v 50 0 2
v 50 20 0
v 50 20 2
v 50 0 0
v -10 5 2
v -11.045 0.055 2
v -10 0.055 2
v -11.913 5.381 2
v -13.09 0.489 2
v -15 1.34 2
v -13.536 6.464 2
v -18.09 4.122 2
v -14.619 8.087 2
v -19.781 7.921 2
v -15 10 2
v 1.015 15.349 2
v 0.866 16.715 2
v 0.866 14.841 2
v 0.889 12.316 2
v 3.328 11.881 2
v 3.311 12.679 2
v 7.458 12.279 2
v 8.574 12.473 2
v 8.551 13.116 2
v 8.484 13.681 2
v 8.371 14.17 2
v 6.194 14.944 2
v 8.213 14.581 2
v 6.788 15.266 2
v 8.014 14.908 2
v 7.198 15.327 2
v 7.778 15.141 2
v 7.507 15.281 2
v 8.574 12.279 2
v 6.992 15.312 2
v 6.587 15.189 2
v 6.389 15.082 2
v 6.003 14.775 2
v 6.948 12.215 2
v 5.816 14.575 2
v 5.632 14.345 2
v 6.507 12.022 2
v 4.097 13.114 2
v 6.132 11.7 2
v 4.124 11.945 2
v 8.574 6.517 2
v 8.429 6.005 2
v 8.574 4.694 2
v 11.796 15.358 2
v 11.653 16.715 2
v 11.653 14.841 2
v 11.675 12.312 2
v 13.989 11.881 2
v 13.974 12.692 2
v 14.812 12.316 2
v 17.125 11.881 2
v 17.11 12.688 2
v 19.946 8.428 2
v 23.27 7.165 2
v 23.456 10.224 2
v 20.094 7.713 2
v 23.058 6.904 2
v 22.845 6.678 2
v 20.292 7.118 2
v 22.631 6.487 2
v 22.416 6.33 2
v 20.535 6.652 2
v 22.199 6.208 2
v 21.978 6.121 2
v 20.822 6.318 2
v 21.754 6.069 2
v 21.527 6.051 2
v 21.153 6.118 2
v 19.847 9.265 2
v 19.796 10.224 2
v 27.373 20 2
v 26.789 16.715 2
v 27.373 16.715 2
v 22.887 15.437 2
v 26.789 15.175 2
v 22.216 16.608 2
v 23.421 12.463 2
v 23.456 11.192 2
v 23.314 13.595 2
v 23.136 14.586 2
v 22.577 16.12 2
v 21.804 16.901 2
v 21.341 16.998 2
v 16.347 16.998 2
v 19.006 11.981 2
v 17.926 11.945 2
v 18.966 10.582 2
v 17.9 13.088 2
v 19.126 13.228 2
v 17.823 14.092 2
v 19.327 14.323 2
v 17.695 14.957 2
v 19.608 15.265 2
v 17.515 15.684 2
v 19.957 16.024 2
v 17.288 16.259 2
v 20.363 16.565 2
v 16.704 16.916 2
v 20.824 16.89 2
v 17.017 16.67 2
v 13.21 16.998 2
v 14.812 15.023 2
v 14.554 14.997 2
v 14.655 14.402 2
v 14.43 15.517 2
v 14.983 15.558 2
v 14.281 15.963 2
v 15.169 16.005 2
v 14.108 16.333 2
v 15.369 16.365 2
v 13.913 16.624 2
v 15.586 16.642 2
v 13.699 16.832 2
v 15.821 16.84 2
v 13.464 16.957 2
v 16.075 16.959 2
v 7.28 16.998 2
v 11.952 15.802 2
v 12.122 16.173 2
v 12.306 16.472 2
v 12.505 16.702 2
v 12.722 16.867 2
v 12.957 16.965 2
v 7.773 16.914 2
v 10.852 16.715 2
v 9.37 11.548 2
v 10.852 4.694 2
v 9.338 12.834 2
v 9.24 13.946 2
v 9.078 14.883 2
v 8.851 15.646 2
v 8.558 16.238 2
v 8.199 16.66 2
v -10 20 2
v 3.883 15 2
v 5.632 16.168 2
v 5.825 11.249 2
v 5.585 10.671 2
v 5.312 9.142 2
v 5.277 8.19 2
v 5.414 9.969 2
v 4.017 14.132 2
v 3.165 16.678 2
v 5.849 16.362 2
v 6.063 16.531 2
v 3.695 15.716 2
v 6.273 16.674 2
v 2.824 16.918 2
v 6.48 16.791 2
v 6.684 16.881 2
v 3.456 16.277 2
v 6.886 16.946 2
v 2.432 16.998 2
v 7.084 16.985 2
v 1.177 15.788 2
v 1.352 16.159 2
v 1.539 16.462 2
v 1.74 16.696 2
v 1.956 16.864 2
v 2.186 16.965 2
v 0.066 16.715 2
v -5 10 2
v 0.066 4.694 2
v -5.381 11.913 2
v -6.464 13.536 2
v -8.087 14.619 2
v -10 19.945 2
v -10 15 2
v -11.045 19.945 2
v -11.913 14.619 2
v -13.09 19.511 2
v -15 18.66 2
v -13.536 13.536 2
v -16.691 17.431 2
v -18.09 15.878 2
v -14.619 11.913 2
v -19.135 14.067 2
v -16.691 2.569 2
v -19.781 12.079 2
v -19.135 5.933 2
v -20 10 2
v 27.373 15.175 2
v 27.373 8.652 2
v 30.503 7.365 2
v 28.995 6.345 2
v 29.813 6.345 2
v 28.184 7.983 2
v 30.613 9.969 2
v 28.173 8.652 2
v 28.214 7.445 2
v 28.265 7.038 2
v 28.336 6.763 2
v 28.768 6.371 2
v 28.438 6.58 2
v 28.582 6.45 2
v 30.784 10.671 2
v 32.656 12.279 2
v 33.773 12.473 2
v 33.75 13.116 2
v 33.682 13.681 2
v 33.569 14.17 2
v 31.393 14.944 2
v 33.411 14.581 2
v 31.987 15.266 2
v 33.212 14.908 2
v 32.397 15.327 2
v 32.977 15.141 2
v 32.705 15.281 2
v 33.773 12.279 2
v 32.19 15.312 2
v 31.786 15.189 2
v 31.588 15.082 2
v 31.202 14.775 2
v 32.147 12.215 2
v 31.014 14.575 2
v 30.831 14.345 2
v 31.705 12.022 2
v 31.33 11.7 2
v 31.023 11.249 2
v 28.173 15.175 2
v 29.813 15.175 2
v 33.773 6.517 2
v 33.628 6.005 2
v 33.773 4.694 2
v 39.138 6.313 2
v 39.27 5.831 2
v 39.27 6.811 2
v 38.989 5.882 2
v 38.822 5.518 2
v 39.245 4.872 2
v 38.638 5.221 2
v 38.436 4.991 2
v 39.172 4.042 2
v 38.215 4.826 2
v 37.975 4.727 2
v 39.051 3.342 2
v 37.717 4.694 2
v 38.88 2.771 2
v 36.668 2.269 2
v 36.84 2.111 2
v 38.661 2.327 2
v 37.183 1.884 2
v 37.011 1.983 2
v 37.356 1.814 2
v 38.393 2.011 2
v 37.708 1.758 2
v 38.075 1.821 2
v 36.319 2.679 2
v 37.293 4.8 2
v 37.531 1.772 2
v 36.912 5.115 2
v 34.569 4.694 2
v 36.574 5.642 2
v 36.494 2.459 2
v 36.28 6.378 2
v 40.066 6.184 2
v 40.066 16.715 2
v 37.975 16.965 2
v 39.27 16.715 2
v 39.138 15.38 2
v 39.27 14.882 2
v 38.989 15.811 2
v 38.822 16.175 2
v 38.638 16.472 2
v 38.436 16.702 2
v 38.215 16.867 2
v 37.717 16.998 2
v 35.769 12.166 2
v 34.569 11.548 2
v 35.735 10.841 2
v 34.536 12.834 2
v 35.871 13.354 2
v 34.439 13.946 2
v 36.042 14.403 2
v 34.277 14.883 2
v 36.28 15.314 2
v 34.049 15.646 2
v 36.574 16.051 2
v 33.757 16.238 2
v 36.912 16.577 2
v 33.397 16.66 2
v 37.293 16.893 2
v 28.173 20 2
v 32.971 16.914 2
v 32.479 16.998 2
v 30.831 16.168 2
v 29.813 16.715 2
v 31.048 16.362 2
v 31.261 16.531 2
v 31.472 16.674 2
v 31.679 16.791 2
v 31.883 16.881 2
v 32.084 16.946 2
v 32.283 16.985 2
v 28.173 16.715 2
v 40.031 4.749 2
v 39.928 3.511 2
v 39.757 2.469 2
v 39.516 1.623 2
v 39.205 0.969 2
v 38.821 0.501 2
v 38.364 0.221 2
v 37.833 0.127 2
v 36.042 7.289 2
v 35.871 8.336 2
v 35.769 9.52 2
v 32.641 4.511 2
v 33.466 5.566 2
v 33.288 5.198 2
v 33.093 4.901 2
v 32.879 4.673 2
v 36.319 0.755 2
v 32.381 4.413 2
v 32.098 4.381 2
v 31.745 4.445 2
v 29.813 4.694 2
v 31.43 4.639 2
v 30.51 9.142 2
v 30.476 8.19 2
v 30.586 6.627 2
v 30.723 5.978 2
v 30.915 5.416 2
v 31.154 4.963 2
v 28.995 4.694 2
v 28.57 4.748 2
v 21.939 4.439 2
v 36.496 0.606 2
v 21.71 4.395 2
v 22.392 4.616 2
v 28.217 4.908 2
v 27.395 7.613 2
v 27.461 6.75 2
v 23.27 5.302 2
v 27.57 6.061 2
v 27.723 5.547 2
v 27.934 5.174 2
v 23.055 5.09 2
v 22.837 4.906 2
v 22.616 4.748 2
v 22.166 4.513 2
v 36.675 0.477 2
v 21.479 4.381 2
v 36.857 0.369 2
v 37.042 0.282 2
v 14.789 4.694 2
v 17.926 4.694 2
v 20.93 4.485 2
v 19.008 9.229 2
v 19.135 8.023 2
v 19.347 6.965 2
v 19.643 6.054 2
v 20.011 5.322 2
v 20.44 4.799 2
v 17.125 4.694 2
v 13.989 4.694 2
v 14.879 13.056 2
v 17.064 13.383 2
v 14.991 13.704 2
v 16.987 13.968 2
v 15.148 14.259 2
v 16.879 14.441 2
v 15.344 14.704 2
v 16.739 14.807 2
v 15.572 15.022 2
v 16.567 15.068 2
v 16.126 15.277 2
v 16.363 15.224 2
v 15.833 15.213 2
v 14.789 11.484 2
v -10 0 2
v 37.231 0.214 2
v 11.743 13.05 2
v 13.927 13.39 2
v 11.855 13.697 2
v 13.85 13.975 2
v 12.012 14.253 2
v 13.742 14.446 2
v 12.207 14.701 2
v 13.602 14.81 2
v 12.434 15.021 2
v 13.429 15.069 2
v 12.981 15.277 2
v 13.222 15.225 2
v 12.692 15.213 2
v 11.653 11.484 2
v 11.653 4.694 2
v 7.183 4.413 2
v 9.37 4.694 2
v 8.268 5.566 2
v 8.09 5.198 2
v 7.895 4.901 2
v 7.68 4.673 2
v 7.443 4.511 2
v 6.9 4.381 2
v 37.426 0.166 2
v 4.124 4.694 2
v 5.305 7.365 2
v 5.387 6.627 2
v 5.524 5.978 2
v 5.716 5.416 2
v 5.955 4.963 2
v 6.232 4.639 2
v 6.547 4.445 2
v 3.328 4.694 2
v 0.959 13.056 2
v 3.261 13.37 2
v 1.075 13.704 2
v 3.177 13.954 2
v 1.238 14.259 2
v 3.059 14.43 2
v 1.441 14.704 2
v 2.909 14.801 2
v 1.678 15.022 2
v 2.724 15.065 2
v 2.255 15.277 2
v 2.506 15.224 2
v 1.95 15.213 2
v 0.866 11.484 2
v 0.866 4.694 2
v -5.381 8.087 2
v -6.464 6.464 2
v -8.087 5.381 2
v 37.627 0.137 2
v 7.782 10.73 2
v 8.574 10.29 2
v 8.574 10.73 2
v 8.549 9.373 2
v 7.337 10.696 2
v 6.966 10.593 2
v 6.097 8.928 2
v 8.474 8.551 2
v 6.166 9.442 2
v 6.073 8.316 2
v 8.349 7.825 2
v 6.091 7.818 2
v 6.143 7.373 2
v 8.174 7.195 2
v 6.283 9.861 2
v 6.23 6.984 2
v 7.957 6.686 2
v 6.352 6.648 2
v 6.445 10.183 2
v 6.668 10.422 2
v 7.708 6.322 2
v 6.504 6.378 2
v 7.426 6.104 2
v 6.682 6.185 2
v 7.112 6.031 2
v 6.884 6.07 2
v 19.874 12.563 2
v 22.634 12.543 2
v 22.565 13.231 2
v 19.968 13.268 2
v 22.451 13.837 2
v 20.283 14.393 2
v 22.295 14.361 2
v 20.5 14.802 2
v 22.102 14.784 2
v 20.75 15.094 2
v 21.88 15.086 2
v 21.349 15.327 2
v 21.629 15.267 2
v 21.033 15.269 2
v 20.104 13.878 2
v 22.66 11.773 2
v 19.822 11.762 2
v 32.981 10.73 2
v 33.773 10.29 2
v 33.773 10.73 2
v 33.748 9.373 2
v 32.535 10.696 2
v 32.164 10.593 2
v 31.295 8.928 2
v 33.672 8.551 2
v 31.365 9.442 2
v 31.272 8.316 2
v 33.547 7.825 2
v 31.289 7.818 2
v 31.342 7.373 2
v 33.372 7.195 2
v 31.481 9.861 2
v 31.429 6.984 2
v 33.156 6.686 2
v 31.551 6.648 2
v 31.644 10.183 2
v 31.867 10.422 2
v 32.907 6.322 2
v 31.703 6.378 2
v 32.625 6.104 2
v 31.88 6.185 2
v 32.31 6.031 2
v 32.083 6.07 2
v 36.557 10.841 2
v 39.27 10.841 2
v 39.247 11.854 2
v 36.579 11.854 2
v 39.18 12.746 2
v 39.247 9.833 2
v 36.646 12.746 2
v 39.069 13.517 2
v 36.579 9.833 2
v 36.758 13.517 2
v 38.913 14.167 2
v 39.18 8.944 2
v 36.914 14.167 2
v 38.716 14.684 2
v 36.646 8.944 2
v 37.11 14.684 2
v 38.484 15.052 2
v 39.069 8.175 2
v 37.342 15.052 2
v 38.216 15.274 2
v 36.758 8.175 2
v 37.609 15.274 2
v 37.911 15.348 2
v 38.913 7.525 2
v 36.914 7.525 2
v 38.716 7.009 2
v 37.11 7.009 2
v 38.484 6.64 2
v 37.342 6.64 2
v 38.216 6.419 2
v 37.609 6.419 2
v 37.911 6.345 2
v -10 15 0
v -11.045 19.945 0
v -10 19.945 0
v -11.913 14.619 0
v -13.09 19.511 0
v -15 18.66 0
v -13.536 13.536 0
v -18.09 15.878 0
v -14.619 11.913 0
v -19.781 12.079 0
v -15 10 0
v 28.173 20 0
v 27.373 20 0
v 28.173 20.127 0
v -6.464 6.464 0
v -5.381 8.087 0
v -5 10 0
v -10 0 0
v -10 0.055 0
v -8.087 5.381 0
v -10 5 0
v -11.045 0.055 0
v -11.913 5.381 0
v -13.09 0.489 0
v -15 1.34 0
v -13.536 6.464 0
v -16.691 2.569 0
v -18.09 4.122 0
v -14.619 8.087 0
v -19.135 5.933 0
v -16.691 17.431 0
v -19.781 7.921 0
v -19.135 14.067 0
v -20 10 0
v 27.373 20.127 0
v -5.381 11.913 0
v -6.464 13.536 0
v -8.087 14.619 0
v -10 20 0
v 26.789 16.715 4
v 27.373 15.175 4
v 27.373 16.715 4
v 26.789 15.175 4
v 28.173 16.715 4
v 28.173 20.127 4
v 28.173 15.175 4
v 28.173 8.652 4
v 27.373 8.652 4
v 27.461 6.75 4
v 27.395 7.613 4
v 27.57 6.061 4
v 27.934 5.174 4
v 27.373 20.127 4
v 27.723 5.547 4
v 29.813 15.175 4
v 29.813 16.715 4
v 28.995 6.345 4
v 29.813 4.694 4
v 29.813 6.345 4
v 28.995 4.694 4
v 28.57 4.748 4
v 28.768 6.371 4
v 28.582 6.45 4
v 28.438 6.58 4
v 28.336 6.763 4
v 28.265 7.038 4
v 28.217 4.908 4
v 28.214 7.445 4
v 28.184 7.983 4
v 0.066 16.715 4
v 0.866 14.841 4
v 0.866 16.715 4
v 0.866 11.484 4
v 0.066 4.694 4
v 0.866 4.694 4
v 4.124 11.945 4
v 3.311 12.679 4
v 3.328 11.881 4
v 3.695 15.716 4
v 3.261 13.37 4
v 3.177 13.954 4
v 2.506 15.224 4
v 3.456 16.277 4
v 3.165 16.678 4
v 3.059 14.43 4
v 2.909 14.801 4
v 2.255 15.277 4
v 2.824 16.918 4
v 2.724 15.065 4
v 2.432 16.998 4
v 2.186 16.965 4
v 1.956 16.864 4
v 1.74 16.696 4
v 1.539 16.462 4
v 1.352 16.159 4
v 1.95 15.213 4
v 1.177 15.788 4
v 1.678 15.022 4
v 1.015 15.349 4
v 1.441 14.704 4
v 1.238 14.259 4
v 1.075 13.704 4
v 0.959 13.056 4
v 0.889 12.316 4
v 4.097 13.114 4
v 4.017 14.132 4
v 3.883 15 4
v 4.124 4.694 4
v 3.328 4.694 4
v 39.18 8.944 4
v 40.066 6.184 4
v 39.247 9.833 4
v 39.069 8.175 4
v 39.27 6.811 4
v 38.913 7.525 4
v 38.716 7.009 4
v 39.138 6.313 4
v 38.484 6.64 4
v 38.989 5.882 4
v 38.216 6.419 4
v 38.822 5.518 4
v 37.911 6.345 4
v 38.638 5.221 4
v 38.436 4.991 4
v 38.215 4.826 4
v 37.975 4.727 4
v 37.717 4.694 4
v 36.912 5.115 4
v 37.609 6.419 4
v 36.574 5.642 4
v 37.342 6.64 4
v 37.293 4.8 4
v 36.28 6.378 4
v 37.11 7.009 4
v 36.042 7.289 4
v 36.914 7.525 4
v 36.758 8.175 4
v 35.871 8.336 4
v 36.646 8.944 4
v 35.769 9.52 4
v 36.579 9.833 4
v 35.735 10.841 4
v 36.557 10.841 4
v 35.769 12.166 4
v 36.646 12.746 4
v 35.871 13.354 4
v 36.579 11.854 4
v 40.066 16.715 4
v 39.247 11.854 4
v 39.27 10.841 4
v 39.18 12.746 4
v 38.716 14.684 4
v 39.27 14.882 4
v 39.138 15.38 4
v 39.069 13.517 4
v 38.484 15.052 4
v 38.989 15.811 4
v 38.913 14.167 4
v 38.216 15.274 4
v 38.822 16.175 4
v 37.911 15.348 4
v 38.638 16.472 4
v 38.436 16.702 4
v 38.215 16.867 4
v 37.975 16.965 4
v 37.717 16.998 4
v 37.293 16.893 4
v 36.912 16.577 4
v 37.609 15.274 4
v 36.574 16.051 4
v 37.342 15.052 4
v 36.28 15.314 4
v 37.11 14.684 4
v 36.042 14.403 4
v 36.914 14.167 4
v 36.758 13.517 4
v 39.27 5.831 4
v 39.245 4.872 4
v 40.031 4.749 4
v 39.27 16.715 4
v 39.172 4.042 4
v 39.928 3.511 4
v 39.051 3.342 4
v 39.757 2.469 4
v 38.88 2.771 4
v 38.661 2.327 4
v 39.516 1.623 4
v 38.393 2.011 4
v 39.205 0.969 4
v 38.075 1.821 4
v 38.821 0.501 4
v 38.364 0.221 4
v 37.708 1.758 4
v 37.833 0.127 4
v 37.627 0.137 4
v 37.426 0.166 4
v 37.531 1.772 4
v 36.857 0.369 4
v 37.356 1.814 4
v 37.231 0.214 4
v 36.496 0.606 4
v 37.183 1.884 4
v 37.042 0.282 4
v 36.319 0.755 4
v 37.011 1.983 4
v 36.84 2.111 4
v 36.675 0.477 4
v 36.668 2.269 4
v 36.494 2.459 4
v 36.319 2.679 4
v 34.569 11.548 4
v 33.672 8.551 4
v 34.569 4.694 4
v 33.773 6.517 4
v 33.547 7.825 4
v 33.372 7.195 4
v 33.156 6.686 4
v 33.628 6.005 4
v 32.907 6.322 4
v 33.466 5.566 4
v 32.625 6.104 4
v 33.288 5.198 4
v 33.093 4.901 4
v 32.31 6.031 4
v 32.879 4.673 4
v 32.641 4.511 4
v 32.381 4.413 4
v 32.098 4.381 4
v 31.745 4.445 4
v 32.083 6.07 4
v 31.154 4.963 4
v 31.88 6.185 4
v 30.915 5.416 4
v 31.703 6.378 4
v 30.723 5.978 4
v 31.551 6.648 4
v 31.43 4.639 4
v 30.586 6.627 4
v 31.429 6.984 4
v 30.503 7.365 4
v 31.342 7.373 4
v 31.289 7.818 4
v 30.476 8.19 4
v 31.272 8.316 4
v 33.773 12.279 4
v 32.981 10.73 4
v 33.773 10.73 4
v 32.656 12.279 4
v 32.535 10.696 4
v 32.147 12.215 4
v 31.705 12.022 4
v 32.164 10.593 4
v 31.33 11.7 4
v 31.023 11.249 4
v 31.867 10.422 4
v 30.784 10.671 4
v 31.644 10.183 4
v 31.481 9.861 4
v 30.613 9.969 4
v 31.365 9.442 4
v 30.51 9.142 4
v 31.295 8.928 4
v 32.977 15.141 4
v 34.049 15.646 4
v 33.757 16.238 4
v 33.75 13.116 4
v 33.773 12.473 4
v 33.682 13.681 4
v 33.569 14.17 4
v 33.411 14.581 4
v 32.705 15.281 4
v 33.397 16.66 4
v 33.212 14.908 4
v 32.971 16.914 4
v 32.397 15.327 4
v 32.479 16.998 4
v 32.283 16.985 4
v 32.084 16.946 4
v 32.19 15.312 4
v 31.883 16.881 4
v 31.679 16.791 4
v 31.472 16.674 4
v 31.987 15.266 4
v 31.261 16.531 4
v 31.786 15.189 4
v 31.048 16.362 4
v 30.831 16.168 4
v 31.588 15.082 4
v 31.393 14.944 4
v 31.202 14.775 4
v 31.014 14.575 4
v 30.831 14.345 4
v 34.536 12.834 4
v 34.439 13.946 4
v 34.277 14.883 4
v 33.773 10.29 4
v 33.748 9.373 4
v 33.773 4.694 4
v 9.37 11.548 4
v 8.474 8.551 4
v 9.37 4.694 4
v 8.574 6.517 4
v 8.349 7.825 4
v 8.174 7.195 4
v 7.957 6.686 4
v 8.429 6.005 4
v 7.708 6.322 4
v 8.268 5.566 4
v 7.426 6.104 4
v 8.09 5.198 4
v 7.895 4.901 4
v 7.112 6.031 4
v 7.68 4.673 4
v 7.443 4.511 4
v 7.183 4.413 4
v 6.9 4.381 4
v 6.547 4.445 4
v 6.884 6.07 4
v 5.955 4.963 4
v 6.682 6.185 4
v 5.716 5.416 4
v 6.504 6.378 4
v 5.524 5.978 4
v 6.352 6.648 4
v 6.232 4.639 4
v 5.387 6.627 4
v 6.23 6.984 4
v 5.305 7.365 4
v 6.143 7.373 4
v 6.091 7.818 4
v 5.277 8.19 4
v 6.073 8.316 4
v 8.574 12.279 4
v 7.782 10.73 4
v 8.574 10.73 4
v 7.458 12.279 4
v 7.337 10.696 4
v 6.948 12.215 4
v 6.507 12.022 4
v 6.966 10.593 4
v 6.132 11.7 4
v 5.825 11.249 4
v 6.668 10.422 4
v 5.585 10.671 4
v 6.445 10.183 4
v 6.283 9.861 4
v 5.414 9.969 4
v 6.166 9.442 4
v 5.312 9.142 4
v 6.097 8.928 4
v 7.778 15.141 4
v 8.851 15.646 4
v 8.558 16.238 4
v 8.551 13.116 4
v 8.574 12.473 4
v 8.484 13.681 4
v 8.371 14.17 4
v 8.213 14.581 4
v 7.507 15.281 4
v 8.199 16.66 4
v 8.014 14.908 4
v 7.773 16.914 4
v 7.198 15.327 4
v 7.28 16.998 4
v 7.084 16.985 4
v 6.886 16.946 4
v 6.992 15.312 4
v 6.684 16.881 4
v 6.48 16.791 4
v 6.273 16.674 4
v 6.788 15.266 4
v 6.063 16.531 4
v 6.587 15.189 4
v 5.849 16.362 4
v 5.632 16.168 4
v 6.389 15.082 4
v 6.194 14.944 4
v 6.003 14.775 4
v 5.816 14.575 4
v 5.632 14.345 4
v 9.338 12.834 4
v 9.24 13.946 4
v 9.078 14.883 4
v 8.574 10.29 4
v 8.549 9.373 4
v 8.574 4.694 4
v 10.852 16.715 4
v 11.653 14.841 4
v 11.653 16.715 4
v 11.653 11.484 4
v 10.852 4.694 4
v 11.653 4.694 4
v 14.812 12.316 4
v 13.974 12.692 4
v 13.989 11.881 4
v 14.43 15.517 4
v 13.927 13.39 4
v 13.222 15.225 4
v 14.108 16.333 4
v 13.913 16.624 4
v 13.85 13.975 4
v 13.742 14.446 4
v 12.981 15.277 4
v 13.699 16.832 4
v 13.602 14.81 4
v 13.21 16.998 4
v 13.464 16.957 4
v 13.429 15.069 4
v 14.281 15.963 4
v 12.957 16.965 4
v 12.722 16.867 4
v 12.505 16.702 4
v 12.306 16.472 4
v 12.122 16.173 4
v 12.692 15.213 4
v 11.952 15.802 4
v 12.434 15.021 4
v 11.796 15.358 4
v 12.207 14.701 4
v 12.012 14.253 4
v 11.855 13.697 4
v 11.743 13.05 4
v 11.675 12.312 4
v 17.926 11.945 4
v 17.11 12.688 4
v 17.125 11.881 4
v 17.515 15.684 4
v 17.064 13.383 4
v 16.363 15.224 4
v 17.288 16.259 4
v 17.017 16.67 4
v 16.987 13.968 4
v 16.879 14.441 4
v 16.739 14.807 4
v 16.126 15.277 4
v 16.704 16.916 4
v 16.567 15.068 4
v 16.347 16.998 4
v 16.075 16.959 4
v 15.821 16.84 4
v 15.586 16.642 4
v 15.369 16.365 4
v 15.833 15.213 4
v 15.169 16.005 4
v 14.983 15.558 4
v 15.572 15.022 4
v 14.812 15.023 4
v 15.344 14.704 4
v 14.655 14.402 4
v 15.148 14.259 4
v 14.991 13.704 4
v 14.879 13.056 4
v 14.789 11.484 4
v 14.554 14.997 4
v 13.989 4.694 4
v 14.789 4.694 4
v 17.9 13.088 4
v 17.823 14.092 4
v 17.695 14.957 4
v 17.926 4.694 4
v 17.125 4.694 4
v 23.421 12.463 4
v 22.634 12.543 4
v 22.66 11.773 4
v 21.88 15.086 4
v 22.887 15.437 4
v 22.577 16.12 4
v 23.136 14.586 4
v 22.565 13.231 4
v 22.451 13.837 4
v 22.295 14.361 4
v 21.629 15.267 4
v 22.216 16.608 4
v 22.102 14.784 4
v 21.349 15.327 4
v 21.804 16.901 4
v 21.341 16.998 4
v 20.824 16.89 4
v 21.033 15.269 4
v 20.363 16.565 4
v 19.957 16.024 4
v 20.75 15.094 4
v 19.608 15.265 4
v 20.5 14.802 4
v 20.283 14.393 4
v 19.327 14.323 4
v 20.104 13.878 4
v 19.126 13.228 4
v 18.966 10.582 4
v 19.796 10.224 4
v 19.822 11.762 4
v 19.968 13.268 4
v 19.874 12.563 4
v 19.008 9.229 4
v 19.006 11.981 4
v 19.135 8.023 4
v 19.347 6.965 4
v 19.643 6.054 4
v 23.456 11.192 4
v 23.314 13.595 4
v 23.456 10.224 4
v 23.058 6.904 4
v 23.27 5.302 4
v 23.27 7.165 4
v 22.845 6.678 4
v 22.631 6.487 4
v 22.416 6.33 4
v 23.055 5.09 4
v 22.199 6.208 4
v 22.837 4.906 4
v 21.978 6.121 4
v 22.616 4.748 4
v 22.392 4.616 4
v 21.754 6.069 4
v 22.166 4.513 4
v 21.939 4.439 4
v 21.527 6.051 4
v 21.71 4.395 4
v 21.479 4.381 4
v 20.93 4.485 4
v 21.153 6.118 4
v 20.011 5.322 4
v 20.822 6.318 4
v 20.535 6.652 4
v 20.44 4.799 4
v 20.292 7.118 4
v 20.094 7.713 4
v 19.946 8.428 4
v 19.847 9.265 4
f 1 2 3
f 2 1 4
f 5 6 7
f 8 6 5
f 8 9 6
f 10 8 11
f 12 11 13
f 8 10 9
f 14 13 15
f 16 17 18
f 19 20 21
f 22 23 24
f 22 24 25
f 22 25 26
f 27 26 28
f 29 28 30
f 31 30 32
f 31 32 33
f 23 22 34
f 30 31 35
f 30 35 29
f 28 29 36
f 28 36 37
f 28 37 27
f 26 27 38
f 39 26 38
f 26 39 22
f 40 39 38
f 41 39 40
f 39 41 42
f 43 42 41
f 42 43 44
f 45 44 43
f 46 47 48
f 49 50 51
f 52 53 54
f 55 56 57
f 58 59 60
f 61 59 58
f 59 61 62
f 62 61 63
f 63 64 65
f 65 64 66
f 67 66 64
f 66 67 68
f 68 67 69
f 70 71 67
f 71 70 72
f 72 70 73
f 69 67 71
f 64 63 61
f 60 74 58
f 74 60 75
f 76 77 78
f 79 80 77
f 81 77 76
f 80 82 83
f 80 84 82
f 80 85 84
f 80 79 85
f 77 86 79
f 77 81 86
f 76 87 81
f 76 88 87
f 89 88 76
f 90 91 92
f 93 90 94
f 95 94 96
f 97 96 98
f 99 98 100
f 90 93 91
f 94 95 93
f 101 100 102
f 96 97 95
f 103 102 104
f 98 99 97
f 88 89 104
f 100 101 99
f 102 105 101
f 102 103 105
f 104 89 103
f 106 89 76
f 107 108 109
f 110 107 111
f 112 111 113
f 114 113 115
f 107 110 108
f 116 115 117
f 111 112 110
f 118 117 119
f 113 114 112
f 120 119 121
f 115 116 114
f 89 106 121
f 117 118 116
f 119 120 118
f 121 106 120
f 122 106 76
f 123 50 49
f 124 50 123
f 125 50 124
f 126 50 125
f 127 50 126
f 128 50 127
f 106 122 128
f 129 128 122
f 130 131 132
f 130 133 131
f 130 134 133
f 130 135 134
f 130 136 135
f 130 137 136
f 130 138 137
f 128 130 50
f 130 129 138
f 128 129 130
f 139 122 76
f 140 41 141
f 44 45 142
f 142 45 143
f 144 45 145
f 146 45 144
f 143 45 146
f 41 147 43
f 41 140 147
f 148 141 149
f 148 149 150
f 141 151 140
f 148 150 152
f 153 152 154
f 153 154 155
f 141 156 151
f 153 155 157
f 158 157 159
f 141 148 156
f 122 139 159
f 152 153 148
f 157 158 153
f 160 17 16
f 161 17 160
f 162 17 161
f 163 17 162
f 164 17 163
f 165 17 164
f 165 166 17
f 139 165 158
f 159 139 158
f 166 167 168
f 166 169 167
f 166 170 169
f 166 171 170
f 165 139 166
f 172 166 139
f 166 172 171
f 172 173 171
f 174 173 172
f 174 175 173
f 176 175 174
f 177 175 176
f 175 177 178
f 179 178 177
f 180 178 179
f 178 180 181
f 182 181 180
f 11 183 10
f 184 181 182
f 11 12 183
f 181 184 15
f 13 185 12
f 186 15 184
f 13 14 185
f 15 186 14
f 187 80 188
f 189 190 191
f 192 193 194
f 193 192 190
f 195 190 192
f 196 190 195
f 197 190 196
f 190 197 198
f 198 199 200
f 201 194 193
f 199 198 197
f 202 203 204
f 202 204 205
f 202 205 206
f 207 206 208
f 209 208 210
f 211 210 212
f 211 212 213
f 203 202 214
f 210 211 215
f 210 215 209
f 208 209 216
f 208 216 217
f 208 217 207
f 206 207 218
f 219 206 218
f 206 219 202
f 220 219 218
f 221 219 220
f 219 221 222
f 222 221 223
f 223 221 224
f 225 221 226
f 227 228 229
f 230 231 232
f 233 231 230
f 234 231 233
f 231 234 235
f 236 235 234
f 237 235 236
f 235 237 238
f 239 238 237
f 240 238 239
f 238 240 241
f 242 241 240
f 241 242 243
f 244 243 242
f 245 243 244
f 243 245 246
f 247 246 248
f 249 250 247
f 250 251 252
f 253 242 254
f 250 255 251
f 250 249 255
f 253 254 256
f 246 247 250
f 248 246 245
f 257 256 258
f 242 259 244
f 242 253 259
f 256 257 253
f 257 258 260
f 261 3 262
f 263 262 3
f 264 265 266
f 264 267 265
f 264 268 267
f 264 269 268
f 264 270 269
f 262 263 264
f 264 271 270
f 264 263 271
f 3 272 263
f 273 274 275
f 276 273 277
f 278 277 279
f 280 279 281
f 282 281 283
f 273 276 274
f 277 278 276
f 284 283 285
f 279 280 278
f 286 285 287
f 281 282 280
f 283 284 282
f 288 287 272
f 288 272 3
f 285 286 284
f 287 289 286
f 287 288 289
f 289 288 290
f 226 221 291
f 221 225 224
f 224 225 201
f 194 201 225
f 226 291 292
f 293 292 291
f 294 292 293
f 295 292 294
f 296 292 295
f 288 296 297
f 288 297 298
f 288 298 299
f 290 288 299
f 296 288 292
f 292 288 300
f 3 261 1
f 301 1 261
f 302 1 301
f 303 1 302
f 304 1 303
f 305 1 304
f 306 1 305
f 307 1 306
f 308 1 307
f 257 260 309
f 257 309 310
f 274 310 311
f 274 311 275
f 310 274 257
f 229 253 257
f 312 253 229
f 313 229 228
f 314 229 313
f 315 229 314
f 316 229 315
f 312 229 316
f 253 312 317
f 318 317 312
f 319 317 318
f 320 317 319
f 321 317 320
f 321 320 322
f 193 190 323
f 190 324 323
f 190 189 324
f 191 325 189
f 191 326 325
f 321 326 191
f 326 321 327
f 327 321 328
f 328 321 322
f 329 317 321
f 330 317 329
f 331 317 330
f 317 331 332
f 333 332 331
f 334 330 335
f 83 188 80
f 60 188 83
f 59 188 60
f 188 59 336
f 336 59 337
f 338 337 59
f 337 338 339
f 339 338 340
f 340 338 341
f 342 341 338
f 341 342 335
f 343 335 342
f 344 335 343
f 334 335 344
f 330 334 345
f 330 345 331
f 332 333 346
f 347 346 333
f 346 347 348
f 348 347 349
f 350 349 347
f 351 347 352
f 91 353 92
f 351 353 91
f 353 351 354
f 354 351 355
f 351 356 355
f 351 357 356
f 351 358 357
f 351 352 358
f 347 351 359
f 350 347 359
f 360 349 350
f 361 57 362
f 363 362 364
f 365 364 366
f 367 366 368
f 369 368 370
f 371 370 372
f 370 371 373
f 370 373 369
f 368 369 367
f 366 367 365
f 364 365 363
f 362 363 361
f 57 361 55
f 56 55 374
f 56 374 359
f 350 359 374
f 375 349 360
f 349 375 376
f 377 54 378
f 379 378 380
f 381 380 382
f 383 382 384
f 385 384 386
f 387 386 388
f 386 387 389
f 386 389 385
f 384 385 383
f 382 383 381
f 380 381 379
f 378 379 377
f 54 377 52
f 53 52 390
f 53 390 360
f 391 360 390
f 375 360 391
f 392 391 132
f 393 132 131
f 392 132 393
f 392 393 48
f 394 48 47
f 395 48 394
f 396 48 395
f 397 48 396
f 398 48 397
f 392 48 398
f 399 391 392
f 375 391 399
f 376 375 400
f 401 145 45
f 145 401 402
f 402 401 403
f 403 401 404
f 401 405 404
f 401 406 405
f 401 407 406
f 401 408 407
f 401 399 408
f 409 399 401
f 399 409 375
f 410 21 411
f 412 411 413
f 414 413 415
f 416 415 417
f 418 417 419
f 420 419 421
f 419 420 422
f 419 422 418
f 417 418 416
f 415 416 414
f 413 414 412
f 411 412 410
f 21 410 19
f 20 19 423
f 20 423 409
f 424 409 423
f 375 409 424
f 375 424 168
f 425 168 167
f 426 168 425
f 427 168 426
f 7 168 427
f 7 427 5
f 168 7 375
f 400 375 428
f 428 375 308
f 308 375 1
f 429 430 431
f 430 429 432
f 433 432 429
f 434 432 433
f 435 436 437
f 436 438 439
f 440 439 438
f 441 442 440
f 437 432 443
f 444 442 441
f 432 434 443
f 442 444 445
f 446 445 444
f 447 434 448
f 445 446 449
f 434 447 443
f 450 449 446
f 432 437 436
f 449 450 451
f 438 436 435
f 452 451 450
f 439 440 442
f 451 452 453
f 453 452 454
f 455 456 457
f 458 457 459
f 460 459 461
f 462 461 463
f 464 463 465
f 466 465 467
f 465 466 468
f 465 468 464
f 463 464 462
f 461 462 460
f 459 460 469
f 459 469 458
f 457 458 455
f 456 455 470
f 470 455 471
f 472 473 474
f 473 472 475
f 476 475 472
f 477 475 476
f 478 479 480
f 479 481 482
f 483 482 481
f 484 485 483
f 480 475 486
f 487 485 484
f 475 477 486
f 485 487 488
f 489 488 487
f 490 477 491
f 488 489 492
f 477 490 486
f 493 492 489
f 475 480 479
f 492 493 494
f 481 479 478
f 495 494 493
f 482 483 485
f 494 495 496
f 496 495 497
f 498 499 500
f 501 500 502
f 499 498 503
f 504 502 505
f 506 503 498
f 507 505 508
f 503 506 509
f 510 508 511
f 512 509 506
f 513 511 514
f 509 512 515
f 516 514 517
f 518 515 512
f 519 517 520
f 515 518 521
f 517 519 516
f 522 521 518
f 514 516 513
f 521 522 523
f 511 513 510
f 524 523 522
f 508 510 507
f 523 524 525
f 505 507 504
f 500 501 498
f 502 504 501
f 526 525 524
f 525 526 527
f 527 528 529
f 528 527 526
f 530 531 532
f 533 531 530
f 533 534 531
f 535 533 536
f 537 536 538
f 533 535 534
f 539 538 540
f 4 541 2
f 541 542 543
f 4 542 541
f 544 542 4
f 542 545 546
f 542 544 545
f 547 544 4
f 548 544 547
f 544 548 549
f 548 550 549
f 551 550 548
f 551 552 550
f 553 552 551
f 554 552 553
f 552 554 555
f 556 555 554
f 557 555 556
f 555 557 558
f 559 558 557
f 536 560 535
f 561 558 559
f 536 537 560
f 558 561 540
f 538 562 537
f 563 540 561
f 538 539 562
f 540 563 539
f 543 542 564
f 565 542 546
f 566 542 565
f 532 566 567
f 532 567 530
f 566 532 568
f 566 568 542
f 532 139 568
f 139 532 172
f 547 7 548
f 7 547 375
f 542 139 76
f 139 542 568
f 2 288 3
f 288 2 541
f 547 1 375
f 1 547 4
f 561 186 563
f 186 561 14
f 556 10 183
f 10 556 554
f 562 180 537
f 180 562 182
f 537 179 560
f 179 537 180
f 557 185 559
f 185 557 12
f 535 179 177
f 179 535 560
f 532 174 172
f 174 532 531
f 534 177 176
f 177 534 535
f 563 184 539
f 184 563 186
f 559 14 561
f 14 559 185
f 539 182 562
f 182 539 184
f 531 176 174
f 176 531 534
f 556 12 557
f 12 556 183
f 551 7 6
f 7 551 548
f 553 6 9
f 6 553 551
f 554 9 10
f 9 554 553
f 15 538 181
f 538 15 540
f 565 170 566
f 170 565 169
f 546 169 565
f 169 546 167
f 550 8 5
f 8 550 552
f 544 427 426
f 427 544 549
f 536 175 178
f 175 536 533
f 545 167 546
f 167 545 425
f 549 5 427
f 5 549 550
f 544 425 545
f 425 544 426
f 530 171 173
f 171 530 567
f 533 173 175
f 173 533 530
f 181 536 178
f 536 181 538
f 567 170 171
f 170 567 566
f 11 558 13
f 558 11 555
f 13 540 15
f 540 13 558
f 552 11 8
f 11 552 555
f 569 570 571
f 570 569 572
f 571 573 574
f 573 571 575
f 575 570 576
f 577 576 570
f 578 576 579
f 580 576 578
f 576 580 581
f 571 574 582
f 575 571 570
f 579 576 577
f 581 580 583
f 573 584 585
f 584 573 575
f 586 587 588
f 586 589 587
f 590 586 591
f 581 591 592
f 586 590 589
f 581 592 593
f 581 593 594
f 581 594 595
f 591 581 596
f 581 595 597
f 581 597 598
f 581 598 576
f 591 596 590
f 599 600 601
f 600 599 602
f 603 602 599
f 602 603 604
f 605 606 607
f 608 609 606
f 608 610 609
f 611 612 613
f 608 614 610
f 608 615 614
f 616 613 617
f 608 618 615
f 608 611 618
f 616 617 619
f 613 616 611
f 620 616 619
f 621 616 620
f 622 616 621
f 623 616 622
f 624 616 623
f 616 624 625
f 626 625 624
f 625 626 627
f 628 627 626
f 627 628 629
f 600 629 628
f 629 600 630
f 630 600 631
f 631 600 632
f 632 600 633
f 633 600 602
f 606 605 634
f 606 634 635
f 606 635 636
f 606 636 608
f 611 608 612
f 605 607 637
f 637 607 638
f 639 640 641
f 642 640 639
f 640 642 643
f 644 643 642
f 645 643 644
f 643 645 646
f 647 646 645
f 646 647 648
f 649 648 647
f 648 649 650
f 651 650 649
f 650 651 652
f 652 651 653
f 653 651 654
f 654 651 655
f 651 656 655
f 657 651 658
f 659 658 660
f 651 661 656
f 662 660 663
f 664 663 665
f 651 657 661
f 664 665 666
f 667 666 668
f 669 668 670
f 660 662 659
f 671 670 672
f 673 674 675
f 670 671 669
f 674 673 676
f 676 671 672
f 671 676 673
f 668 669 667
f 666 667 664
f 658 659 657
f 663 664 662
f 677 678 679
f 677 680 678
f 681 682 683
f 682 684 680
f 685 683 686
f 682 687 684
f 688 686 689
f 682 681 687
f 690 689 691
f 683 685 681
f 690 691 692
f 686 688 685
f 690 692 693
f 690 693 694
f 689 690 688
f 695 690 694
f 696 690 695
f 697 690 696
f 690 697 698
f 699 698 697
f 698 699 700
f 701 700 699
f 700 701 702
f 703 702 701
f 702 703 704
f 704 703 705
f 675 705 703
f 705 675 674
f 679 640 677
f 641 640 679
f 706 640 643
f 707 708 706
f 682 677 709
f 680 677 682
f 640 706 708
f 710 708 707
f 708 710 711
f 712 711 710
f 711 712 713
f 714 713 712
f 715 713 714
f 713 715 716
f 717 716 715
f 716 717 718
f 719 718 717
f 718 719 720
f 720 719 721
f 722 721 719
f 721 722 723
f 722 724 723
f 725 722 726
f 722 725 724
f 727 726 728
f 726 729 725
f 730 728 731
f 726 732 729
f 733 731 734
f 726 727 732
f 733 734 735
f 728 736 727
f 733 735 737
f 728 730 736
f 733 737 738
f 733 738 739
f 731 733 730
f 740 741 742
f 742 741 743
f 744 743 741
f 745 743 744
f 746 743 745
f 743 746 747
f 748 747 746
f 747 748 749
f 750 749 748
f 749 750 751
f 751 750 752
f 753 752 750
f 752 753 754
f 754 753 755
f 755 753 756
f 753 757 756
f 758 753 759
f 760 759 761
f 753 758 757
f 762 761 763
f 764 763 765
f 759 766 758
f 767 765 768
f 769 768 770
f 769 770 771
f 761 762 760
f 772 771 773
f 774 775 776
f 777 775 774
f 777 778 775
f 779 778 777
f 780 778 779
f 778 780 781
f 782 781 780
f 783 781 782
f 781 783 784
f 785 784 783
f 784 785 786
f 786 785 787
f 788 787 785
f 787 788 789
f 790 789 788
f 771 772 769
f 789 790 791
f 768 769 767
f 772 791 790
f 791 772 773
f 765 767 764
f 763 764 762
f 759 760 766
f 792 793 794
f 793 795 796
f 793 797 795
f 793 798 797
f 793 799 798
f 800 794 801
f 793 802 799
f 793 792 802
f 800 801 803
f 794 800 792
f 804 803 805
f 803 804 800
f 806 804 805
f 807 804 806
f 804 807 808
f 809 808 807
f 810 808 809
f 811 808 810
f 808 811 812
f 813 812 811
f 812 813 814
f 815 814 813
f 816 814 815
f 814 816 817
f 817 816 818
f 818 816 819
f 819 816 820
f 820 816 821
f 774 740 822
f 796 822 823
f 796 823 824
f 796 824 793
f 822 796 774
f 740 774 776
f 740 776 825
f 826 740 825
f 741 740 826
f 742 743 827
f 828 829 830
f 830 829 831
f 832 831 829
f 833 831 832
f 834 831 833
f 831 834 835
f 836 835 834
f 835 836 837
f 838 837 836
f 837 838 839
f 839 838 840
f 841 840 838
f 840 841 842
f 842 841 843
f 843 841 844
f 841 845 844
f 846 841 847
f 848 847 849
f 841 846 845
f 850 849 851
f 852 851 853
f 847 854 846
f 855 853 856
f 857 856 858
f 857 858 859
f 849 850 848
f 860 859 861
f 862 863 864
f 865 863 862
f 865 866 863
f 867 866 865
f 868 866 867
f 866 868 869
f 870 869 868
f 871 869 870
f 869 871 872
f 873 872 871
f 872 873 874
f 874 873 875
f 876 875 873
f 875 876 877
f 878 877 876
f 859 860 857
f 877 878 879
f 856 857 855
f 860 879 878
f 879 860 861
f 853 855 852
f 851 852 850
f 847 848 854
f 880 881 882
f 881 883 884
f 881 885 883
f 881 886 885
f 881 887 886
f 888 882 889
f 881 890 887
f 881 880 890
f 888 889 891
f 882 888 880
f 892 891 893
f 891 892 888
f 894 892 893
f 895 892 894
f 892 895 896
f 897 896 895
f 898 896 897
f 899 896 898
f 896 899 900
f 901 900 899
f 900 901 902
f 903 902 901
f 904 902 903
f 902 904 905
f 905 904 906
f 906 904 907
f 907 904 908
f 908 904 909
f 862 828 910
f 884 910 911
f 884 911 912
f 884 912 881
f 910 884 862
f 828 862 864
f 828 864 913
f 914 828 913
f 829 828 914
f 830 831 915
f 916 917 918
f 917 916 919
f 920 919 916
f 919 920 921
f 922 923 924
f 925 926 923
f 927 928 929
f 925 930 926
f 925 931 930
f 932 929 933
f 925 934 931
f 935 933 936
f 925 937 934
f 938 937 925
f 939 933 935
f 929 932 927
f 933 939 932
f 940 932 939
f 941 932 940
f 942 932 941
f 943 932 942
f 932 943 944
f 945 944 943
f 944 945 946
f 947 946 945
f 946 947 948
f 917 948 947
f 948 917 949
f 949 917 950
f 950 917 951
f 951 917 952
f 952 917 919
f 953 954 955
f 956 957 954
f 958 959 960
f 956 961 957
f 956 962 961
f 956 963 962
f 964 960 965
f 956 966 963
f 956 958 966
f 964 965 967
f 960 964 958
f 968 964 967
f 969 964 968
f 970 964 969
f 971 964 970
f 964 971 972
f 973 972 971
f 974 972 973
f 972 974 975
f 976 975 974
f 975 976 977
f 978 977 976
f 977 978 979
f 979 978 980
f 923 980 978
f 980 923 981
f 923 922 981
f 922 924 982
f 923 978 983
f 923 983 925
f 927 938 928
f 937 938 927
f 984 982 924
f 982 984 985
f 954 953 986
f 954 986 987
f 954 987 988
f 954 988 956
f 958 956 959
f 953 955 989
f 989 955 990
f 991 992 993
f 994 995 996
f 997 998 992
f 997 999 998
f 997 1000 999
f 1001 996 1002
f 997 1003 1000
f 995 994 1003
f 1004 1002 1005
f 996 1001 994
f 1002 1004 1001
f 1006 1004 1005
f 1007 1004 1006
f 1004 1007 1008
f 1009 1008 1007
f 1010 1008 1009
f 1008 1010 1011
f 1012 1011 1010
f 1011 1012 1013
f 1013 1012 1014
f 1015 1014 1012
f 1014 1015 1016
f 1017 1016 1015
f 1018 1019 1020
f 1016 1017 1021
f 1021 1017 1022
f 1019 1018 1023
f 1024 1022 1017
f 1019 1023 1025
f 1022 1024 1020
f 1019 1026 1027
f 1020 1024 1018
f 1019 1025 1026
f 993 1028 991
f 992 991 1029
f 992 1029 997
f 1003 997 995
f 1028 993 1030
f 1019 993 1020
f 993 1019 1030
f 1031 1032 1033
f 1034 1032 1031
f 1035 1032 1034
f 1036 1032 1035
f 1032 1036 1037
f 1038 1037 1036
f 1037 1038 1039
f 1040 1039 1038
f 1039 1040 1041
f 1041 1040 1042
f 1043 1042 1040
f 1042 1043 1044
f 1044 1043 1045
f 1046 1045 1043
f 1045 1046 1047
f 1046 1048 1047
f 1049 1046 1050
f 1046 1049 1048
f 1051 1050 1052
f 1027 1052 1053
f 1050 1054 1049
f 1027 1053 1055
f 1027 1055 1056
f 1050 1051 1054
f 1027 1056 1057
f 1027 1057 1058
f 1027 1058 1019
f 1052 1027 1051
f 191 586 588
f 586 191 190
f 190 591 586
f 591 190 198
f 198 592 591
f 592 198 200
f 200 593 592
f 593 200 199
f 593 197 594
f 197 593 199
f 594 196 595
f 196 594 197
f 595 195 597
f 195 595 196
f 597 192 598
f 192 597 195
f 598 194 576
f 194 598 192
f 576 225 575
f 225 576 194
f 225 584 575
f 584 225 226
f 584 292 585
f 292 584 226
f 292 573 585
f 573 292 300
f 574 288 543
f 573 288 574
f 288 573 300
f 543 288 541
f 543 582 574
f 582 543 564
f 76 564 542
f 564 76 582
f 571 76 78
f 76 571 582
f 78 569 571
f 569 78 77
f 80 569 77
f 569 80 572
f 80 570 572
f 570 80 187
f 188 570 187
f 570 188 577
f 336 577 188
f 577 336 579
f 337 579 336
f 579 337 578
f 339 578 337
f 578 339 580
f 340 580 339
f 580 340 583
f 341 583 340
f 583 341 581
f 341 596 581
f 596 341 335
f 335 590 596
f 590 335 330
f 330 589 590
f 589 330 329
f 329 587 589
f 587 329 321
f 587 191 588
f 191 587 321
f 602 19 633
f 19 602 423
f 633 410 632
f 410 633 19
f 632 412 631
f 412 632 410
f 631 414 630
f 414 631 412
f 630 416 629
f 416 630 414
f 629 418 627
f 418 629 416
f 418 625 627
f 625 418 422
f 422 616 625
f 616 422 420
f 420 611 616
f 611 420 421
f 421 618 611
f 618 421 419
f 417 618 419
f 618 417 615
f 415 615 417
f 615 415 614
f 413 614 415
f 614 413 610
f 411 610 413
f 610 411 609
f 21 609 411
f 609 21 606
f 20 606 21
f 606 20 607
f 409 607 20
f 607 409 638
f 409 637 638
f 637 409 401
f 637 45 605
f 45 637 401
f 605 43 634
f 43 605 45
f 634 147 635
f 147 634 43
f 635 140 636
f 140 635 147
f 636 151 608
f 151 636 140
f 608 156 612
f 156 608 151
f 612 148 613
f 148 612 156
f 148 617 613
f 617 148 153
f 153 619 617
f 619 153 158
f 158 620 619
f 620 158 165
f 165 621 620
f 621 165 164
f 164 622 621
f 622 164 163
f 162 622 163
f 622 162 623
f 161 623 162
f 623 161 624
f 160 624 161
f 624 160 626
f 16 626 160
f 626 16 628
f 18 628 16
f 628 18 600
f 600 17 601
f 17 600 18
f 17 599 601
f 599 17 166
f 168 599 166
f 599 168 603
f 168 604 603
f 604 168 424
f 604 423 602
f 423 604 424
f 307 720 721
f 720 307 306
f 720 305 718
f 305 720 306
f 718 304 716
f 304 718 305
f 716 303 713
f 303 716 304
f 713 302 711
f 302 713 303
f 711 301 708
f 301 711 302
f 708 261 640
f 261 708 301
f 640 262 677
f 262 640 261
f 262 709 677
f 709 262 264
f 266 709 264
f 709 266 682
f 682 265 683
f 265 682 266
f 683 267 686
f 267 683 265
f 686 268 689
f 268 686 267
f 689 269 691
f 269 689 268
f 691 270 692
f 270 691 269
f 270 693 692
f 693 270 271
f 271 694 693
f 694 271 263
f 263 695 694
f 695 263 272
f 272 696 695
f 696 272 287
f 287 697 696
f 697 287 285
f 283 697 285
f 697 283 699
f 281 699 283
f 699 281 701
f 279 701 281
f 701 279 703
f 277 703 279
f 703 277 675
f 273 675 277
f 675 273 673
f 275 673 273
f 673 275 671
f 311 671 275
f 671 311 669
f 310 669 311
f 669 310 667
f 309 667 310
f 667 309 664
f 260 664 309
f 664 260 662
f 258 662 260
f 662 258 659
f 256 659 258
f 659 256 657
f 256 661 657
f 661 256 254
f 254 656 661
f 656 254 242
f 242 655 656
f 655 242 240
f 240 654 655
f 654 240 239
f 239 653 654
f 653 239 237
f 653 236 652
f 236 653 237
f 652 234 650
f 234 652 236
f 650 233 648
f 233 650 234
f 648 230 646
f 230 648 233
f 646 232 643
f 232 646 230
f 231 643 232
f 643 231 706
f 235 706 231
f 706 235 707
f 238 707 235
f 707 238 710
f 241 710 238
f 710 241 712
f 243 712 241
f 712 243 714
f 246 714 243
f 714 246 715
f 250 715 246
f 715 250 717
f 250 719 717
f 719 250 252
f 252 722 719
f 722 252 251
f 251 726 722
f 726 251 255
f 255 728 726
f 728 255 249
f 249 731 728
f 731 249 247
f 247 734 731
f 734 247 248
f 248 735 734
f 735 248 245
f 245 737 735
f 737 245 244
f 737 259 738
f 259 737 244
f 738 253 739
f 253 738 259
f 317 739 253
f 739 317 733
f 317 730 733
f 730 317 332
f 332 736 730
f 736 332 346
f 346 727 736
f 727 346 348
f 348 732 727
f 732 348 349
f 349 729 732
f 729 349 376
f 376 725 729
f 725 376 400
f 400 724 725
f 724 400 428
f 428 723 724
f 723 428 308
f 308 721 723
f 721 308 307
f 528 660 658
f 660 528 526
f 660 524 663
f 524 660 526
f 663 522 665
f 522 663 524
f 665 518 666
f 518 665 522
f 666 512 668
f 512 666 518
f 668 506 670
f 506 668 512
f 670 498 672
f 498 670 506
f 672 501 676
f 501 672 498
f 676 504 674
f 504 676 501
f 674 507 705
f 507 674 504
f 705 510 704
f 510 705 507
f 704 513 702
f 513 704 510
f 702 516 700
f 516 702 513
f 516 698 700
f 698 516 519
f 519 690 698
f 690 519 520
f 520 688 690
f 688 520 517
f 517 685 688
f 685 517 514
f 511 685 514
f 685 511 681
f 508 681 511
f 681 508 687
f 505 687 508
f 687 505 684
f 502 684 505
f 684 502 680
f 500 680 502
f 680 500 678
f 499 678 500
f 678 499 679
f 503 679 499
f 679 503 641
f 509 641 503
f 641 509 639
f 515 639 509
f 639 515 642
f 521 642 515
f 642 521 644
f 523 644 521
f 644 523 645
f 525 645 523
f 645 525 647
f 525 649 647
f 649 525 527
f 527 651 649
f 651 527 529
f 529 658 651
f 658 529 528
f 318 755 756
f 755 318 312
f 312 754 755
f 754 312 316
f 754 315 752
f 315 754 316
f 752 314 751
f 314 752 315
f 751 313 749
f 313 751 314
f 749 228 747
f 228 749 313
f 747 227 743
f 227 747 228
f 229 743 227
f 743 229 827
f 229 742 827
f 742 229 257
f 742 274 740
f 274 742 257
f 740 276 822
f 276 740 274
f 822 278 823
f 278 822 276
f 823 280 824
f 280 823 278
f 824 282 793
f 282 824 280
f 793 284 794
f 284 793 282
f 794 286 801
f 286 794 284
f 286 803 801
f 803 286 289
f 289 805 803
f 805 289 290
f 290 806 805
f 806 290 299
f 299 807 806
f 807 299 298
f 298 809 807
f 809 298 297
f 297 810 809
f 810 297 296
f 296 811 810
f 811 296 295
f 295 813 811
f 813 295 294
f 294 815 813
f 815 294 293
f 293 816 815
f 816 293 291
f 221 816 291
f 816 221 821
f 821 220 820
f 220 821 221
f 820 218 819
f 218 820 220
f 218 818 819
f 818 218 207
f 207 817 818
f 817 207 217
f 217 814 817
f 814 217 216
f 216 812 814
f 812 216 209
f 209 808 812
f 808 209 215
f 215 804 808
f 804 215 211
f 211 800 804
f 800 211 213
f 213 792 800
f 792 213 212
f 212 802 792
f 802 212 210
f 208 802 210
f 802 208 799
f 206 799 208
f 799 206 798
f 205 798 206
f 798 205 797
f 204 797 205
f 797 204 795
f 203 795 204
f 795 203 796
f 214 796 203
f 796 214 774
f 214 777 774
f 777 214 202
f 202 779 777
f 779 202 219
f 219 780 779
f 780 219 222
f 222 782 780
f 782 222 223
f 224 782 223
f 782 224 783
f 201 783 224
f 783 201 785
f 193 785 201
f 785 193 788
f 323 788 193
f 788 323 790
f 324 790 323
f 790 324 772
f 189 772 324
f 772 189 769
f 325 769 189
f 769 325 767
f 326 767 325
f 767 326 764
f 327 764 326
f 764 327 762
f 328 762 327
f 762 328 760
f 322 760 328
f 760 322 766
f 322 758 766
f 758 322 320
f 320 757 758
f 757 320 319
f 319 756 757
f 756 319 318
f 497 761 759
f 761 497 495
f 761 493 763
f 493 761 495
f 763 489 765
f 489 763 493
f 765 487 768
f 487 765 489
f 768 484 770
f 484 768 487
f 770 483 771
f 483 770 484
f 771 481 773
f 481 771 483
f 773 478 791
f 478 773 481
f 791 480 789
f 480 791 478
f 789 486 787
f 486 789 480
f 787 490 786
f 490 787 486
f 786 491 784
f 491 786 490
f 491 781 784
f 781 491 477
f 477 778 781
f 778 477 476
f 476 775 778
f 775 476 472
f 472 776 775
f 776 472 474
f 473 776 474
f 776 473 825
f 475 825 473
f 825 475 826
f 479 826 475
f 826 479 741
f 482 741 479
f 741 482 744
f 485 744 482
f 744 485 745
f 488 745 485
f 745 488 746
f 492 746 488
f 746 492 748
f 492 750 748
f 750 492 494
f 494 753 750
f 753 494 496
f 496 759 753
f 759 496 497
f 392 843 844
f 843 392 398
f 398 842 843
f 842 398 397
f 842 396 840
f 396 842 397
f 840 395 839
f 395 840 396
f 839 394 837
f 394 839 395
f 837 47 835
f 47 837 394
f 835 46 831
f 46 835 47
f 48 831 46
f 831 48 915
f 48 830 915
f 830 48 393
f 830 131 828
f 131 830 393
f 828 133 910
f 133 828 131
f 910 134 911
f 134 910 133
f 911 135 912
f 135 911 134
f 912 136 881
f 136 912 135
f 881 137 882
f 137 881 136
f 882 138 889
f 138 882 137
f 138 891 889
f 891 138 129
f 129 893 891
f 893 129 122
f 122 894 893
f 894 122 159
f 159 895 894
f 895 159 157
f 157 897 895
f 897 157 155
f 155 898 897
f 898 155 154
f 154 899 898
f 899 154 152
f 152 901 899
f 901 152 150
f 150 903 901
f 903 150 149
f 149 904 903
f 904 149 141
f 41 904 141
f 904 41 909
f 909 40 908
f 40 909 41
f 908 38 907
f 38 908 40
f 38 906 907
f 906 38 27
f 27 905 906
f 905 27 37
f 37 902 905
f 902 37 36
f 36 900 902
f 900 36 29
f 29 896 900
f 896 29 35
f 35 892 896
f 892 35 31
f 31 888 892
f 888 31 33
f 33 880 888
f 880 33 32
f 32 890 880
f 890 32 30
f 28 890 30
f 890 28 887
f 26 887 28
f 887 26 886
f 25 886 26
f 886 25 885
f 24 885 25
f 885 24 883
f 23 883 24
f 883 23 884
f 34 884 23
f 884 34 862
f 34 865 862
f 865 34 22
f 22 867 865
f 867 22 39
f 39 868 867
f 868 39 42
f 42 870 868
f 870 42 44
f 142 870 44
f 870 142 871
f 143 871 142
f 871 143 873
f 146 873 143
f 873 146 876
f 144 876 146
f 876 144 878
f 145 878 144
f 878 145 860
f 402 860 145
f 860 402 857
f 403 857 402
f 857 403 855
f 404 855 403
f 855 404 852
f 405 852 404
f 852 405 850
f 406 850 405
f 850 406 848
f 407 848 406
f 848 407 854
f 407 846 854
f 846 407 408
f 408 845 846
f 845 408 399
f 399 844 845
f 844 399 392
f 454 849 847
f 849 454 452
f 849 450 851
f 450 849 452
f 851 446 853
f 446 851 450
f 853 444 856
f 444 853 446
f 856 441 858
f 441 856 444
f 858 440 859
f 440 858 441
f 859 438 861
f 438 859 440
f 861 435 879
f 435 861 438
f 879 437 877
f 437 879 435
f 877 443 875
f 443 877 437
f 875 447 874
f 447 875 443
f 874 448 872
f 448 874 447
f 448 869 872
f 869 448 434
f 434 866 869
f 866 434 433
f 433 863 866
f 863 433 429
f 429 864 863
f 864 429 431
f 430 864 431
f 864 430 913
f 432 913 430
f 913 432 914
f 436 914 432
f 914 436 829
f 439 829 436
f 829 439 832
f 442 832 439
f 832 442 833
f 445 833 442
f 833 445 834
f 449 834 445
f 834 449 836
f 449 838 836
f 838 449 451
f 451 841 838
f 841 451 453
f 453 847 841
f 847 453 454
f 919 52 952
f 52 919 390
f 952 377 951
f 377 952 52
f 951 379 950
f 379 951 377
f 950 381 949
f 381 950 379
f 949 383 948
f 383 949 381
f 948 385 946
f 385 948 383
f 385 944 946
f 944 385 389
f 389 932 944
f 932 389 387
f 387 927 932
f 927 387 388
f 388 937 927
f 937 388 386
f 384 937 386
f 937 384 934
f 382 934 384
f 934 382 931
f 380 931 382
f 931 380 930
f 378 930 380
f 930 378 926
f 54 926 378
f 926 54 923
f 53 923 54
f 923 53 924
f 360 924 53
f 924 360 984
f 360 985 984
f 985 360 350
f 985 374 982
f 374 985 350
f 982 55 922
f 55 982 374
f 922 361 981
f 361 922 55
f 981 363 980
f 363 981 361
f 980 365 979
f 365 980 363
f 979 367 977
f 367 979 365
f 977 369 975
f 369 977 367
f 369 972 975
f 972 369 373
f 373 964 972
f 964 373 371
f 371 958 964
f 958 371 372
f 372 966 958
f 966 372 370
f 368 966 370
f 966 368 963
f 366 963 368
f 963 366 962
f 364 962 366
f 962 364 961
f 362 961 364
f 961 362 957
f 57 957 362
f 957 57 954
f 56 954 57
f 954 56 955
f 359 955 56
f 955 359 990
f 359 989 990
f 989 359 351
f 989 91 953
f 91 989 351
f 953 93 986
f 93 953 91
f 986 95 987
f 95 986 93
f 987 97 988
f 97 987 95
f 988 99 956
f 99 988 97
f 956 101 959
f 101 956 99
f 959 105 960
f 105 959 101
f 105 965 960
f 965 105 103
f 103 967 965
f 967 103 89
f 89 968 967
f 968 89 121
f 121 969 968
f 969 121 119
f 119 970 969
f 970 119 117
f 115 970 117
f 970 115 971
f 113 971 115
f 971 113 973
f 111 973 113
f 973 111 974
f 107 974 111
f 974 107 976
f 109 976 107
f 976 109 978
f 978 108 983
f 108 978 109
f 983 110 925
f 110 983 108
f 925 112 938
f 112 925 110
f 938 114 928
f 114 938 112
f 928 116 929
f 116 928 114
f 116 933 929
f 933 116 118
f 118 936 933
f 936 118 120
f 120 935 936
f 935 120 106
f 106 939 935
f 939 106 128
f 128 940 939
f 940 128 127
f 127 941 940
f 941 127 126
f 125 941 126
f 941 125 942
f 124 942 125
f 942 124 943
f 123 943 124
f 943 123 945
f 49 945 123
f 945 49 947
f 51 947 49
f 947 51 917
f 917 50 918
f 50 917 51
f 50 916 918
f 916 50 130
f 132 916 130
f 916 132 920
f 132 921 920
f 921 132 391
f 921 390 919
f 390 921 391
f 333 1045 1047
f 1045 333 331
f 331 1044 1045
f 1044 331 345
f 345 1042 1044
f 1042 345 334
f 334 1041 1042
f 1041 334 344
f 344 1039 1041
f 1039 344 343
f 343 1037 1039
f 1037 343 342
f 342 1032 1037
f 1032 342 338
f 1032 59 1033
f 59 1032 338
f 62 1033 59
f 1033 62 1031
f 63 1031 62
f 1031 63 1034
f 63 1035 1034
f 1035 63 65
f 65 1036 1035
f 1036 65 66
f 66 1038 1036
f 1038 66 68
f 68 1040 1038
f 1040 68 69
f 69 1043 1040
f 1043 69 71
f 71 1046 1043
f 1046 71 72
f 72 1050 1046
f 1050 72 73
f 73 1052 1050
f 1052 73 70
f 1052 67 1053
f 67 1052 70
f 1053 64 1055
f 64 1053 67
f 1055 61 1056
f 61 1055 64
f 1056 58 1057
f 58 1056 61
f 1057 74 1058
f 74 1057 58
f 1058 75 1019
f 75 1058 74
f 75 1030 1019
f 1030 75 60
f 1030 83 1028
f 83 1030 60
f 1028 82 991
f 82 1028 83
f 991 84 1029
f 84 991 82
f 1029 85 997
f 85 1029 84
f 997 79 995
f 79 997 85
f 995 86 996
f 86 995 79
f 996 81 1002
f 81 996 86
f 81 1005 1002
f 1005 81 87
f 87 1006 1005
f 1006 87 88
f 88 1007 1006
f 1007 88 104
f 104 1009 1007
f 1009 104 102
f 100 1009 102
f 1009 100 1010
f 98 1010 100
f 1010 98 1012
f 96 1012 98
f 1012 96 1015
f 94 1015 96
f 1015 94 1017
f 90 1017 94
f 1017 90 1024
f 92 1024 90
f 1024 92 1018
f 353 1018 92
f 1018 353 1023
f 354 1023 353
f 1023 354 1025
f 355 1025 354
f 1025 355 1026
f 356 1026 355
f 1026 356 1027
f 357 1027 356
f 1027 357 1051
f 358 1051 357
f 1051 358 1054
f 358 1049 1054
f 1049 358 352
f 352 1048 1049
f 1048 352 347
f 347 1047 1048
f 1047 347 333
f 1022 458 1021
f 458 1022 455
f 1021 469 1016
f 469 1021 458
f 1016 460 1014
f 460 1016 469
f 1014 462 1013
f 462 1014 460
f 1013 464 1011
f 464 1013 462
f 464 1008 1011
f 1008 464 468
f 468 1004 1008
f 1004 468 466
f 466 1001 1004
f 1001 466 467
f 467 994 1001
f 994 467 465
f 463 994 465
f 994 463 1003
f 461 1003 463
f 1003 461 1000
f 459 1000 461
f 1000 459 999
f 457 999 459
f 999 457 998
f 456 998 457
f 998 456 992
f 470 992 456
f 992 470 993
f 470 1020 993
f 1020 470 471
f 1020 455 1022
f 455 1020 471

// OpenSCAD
module Keychain(name, length, width, height) {
    
    linear_extrude(height=height)
       translate([length/2, width/2])
        resize([length, width]) 
             text(name,font="Chalkboard", halign="center", valign="center");
    
    difference() {
        union() {
            translate([-width/2,0,0]) cube([1.5*length,width,.5*height]);
            translate([-width/2,width/2,0]) cylinder(d=width, h=.5*height);
        }
        translate([-width/2,width/2,0]) cylinder(h=height+1, d=width/2, center=true);
    }
}

Keychain("name tag", 40,20,4);
